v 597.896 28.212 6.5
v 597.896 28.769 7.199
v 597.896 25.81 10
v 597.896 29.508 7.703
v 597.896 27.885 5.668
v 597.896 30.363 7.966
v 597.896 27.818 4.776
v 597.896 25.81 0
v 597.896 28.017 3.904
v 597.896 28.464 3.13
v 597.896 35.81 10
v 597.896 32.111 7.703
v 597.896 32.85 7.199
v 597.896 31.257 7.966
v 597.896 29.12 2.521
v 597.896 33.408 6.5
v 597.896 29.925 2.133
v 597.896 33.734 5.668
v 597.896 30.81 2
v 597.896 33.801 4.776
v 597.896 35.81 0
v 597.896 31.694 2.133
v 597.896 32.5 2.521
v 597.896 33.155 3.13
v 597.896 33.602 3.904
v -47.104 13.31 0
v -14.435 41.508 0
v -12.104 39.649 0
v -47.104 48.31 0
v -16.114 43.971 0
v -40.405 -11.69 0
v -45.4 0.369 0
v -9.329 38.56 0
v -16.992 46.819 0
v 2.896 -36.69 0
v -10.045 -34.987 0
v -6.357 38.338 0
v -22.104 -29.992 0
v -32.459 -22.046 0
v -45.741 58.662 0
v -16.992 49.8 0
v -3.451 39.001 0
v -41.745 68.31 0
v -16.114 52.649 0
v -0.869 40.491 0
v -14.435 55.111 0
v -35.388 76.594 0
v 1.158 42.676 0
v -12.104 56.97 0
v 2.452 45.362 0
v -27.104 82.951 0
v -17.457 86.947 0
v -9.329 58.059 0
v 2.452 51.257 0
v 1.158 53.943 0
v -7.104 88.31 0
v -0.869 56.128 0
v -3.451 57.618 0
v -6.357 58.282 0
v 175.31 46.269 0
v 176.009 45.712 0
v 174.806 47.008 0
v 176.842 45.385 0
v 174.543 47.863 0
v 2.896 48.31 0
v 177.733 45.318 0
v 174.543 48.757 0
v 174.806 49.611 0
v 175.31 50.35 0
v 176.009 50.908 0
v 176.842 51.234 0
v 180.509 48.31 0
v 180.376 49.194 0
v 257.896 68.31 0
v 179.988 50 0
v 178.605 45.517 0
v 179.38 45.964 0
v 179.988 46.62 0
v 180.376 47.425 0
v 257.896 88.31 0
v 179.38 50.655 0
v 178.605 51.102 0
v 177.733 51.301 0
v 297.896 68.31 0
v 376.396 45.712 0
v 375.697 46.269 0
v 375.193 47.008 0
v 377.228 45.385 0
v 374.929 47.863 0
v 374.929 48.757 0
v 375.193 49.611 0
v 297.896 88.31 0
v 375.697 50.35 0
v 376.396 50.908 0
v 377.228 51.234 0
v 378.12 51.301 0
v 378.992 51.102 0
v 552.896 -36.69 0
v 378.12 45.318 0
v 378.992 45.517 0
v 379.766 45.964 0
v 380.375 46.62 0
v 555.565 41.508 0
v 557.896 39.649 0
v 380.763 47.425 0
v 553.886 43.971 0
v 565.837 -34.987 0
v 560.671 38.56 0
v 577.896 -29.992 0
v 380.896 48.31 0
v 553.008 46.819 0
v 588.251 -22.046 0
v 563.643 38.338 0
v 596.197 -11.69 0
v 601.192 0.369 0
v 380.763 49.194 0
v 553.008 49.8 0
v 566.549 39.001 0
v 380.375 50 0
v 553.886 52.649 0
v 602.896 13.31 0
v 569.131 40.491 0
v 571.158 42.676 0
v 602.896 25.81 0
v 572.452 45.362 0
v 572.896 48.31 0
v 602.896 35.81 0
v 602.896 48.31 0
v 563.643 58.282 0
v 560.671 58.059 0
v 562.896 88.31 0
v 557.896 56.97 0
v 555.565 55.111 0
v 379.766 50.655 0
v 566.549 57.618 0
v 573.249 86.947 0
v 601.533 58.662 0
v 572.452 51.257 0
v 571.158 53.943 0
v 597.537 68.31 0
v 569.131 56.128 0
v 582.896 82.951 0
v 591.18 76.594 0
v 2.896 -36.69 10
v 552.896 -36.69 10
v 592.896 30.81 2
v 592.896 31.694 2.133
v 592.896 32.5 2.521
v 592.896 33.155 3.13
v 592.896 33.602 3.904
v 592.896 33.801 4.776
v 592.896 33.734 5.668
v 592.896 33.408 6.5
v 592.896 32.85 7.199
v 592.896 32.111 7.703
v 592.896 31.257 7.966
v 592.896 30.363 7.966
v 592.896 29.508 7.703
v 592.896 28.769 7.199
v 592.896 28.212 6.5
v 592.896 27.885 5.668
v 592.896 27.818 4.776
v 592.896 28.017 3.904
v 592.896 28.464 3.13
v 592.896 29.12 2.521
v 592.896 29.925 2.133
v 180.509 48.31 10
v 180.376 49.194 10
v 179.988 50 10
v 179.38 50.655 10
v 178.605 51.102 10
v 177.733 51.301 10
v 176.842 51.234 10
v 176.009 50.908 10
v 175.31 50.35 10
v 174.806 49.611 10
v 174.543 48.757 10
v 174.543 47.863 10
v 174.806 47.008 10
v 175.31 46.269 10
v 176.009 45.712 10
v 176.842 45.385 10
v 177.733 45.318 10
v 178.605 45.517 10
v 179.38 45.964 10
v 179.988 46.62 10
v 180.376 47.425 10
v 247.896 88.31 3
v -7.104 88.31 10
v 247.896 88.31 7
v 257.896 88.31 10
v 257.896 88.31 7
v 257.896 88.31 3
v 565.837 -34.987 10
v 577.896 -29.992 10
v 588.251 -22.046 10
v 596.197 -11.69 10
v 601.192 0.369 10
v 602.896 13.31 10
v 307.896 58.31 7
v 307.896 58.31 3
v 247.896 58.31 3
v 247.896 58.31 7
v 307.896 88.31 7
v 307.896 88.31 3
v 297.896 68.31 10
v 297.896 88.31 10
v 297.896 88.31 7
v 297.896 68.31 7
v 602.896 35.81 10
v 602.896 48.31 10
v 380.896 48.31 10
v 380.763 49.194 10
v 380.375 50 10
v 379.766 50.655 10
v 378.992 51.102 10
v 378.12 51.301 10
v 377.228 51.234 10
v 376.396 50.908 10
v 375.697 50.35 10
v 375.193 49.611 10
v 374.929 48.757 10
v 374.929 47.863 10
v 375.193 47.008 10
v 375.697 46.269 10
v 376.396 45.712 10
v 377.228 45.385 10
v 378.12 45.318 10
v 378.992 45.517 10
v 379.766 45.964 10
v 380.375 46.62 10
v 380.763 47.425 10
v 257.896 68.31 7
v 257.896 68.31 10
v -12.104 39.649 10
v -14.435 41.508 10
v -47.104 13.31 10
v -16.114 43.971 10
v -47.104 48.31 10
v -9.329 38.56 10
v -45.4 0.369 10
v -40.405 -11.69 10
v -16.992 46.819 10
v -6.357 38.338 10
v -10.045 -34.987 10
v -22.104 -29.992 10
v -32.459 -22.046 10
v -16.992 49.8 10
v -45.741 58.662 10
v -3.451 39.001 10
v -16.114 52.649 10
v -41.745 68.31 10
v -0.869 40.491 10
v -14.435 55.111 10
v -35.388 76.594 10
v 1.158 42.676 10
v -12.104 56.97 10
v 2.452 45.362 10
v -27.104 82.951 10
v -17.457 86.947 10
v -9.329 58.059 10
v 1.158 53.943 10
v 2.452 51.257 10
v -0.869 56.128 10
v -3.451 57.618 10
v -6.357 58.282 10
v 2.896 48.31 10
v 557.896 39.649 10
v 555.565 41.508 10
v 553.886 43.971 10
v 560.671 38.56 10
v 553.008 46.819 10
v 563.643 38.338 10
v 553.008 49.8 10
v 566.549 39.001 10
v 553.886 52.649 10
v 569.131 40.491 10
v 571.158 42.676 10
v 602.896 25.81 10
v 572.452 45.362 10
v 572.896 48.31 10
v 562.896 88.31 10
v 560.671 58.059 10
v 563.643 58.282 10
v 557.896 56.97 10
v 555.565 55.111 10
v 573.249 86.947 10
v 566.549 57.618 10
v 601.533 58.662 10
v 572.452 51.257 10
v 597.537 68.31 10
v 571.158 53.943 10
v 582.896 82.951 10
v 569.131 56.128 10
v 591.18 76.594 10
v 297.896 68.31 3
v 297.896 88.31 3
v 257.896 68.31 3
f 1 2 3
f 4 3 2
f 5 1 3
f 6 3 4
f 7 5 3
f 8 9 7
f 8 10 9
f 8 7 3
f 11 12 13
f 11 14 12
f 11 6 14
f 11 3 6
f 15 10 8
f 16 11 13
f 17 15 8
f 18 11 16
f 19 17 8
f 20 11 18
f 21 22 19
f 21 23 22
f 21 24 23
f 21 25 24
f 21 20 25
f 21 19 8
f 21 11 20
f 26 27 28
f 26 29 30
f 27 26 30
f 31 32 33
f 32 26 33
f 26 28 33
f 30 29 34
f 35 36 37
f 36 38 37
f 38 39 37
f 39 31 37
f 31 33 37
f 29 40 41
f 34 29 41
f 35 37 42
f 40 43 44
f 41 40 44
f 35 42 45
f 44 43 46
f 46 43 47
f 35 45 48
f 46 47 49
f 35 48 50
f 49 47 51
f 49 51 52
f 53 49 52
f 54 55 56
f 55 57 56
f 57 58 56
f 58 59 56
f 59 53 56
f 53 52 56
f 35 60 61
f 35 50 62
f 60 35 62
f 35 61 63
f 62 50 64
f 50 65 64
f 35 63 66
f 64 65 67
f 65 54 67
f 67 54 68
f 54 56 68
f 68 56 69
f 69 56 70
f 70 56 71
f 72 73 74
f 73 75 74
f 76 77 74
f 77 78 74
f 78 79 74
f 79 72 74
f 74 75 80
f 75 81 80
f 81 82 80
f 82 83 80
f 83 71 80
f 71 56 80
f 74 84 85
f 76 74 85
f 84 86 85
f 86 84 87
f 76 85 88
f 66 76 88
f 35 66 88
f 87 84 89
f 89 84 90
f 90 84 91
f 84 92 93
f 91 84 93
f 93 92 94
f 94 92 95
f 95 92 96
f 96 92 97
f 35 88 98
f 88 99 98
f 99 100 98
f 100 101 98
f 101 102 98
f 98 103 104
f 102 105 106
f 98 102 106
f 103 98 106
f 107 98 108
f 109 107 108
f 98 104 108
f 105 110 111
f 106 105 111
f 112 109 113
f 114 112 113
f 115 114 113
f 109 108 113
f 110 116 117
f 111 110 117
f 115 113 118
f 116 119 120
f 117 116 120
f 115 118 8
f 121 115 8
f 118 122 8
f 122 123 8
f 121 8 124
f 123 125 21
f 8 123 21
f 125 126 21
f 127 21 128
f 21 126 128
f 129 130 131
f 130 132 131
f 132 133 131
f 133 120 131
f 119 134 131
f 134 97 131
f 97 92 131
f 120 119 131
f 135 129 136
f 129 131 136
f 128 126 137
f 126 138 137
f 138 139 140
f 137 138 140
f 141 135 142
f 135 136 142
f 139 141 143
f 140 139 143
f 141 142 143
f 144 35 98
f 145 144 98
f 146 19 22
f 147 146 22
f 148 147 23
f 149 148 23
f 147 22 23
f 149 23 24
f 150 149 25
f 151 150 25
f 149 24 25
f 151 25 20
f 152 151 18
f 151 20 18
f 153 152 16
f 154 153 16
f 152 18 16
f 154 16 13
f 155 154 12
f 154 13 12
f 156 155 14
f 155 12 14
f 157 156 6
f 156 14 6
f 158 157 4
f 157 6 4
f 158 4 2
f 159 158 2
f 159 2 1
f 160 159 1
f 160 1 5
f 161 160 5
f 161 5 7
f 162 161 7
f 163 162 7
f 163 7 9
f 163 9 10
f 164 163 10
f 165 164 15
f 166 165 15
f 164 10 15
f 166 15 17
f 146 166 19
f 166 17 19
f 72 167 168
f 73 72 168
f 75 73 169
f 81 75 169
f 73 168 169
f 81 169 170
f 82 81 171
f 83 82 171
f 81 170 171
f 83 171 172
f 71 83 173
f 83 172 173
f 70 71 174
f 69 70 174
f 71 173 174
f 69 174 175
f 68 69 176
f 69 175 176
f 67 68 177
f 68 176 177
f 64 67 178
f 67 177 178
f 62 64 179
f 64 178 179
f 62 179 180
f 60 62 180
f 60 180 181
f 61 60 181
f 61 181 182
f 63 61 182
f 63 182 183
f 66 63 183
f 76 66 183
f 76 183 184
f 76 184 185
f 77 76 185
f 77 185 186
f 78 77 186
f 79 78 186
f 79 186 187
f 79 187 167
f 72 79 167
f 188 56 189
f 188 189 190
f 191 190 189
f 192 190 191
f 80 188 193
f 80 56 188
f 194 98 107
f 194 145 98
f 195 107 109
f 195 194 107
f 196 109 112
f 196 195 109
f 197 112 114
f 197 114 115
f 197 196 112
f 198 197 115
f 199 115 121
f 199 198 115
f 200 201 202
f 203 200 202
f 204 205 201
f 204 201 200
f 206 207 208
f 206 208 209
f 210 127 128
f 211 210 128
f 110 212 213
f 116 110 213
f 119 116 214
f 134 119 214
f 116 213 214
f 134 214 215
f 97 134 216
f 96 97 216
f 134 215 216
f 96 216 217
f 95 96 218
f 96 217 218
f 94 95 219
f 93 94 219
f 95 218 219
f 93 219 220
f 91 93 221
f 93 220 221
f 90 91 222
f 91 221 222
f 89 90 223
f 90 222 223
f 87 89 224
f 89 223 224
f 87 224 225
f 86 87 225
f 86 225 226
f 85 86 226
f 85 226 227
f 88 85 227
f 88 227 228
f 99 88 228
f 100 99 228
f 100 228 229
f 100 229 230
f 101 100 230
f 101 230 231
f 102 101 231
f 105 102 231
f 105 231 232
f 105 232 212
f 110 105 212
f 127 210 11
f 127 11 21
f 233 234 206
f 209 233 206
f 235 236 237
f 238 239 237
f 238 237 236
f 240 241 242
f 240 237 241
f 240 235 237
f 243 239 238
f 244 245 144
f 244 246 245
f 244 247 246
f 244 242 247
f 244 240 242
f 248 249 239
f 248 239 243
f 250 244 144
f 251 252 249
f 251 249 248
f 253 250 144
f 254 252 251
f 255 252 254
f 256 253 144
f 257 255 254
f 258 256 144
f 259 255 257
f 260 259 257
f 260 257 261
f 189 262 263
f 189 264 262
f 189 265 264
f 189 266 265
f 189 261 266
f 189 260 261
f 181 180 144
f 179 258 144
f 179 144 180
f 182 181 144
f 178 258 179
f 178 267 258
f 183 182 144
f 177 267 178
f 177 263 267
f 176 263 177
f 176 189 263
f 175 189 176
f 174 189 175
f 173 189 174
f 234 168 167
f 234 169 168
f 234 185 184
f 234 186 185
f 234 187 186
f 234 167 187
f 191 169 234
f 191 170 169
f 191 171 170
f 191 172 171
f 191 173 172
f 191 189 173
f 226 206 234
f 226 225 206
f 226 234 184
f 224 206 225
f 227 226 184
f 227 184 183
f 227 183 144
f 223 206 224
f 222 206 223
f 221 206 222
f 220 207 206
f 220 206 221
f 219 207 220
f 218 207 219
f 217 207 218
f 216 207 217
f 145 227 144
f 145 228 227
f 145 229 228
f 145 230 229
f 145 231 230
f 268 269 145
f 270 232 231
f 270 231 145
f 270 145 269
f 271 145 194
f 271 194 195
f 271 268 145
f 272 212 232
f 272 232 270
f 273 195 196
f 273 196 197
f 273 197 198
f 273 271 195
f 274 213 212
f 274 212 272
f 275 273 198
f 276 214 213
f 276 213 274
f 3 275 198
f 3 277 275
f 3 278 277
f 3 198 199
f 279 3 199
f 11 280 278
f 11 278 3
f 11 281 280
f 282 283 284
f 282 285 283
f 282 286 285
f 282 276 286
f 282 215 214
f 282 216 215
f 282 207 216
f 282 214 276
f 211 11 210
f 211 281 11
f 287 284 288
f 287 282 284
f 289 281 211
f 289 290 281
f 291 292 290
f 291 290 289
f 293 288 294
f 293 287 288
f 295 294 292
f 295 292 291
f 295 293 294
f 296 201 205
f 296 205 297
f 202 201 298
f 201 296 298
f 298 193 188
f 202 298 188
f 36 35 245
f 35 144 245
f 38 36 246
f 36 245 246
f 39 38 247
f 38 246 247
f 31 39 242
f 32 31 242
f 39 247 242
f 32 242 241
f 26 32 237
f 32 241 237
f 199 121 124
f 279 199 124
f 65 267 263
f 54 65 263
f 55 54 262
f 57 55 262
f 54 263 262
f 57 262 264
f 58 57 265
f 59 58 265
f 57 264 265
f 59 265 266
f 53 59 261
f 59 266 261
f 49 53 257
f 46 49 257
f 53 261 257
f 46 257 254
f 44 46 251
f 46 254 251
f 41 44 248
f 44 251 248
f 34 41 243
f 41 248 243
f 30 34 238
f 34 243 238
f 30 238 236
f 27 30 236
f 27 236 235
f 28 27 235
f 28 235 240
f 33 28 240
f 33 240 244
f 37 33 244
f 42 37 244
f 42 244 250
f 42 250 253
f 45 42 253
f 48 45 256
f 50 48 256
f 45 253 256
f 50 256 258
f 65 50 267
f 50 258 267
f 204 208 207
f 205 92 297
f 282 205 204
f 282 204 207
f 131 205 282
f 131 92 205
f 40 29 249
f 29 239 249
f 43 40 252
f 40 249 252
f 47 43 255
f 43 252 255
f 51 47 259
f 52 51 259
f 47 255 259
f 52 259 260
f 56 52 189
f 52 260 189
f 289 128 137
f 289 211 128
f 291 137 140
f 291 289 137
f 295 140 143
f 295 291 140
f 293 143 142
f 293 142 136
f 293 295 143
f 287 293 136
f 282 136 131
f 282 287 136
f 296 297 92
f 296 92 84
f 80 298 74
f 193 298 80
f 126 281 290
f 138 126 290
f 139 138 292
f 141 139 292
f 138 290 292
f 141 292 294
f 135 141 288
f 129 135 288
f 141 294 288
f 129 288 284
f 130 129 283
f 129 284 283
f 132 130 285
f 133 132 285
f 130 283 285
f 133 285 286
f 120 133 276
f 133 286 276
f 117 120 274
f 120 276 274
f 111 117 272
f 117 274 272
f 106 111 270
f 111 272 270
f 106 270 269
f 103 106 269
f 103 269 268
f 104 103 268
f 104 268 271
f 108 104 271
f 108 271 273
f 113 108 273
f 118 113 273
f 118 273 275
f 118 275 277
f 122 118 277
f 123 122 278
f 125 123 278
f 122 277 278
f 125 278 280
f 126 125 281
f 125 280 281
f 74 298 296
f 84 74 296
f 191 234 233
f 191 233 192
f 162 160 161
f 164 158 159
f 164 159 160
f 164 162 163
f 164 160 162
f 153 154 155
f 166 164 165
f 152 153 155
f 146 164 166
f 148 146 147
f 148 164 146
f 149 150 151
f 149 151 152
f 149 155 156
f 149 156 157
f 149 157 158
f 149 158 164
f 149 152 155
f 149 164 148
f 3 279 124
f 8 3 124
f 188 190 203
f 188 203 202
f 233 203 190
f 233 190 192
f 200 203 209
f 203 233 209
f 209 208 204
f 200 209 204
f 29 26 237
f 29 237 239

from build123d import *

# Parameters (mm, degrees)
SKETCH1_W           = 650
SKETCH1_H           = 125
BOSS_EXTRUDE1_DEPTH = 10
SKETCH2_R           = 10
CUT_EXTRUDE2_DEPTH  = 10
SKETCH3_R           = 10
CUT_EXTRUDE3_DEPTH  = 10
SKETCH8_R           = 3
CUT_EXTRUDE5_DEPTH  = 20
CUT_EXTRUDE7_DEPTH  = 30
CUT_EXTRUDE8_DEPTH  = 30
BOSS_EXTRUDE5_DEPTH = 20
SKETCH12_W          = 10
SKETCH12_H          = 10
CUT_EXTRUDE9_DEPTH  = 5
SKETCH13_R          = 3
CUT_EXTRUDE10_DEPTH = 5
FILLET3_R           = 50
FILLET5_R           = 40
FILLET6_R           = 50
FILLET7_R           = 40
SKETCH14_W          = 133
SKETCH14_H          = 20
CUT_EXTRUDE11_DEPTH = 80


with BuildPart() as part:
    # Sketch1 → Boss-Extrude1 (new body)
    with BuildSketch(Plane.XY):
        with Locations((277.89592831, 25.809681948)):
            Rectangle(SKETCH1_W, SKETCH1_H)
    extrude(amount=BOSS_EXTRUDE1_DEPTH)

    # Sketch2 → Cut-Extrude2 (cut)
    with BuildSketch(Plane.XY.offset(10)):
        with Locations((-7.10407169, 48.309681948)):
            Circle(SKETCH2_R)
    extrude(amount=-CUT_EXTRUDE2_DEPTH, mode=Mode.SUBTRACT)

    # Sketch3 → Cut-Extrude3 (cut)
    with BuildSketch(Plane.XY.offset(10)):
        with Locations((562.89592831, 48.309681948)):
            Circle(SKETCH3_R)
    extrude(amount=-CUT_EXTRUDE3_DEPTH, mode=Mode.SUBTRACT)

    # Sketch8 → Cut-Extrude5 (cut)
    with BuildSketch(Plane.XY.offset(10)):
        with Locations((177.509070801, 48.309681948)):
            Circle(SKETCH8_R)
        with Locations((377.89592831, 48.309681948)):
            Circle(SKETCH8_R)
    extrude(amount=-CUT_EXTRUDE5_DEPTH, mode=Mode.SUBTRACT)

    # Sketch10 → Cut-Extrude7 (cut)
    with BuildSketch(Plane(origin=(0, 88.309681948, 0), x_dir=(1, 0, 0), z_dir=(0, 1, 0))):
        Polygon((277.89592831, -3), (307.89592831, -3), (307.89592831, -7), (277.89592831, -7), (247.89592831, -7), (247.89592831, -3), align=None)
    extrude(amount=-CUT_EXTRUDE7_DEPTH, mode=Mode.SUBTRACT)

    # Sketch9 → Cut-Extrude8 (cut)
    with BuildSketch(Plane.XY.offset(10)):
        Polygon((277.89592831, 68.309681948), (257.89592831, 68.309681948), (257.89592831, 88.309681948), (297.89592831, 88.309681948), (297.89592831, 68.309681948), align=None)
    extrude(amount=-CUT_EXTRUDE8_DEPTH, mode=Mode.SUBTRACT)

    # Sketch7 → Boss-Extrude5 (add)
    with BuildSketch(Plane.XY.offset(10)):
        Polygon((160.89592831, 25.309681948), (158.89592831, 25.309681948), (158.89592831, -34.690318052), (98.89592831, -34.690318052), (98.89592831, 25.309681948), (96.89592831, 25.309681948), (96.89592831, -36.690318052), (160.89592831, -36.690318052), align=None)
        Polygon((89.89592831, 25.309681948), (91.89592831, 25.309681948), (91.89592831, -36.690318052), (27.89592831, -36.690318052), (27.89592831, 25.309681948), (29.89592831, 25.309681948), (29.89592831, -34.690318052), (89.89592831, -34.690318052), align=None)
    extrude(amount=BOSS_EXTRUDE5_DEPTH)

    # Sketch12 → Cut-Extrude9 (cut)
    with BuildSketch(Plane(origin=(602.89592831, 0, 0), x_dir=(0, 0, -1), z_dir=(1, 0, 0))):
        with Locations((-5, 30.809681948)):
            Rectangle(SKETCH12_W, SKETCH12_H)
    extrude(amount=-CUT_EXTRUDE9_DEPTH, mode=Mode.SUBTRACT)

    # Sketch13 → Cut-Extrude10 (cut)
    with BuildSketch(Plane(origin=(597.89592831, 0, 0), x_dir=(0, 0, -1), z_dir=(1, 0, 0))):
        with Locations((-5, 30.809681948)):
            Circle(SKETCH13_R)
    extrude(amount=-CUT_EXTRUDE10_DEPTH, mode=Mode.SUBTRACT)

    # Fillet3
    fillet3_edges = [part.edges().sort_by_distance(p)[0] for p in [
        (602.89592831, -36.690318052, 5),
    ]]
    fillet(fillet3_edges, radius=FILLET3_R)

    # Fillet5
    fillet5_edges = [part.edges().sort_by_distance(p)[0] for p in [
        (602.89592831, 88.309681948, 5),
    ]]
    fillet(fillet5_edges, radius=FILLET5_R)

    # Fillet6
    fillet6_edges = [part.edges().sort_by_distance(p)[0] for p in [
        (-47.10407169, -36.690318052, 5),
    ]]
    fillet(fillet6_edges, radius=FILLET6_R)

    # Fillet7
    fillet7_edges = [part.edges().sort_by_distance(p)[0] for p in [
        (-47.10407169, 88.309681948, 5),
    ]]
    fillet(fillet7_edges, radius=FILLET7_R)

    # Sketch14 → Cut-Extrude11 (cut)
    with BuildSketch(Plane.XZ.offset(36.690318052)):
        with Locations((94.39592831, 20)):
            Rectangle(SKETCH14_W, SKETCH14_H)
    extrude(amount=-CUT_EXTRUDE11_DEPTH, mode=Mode.SUBTRACT)


solid = part.part
